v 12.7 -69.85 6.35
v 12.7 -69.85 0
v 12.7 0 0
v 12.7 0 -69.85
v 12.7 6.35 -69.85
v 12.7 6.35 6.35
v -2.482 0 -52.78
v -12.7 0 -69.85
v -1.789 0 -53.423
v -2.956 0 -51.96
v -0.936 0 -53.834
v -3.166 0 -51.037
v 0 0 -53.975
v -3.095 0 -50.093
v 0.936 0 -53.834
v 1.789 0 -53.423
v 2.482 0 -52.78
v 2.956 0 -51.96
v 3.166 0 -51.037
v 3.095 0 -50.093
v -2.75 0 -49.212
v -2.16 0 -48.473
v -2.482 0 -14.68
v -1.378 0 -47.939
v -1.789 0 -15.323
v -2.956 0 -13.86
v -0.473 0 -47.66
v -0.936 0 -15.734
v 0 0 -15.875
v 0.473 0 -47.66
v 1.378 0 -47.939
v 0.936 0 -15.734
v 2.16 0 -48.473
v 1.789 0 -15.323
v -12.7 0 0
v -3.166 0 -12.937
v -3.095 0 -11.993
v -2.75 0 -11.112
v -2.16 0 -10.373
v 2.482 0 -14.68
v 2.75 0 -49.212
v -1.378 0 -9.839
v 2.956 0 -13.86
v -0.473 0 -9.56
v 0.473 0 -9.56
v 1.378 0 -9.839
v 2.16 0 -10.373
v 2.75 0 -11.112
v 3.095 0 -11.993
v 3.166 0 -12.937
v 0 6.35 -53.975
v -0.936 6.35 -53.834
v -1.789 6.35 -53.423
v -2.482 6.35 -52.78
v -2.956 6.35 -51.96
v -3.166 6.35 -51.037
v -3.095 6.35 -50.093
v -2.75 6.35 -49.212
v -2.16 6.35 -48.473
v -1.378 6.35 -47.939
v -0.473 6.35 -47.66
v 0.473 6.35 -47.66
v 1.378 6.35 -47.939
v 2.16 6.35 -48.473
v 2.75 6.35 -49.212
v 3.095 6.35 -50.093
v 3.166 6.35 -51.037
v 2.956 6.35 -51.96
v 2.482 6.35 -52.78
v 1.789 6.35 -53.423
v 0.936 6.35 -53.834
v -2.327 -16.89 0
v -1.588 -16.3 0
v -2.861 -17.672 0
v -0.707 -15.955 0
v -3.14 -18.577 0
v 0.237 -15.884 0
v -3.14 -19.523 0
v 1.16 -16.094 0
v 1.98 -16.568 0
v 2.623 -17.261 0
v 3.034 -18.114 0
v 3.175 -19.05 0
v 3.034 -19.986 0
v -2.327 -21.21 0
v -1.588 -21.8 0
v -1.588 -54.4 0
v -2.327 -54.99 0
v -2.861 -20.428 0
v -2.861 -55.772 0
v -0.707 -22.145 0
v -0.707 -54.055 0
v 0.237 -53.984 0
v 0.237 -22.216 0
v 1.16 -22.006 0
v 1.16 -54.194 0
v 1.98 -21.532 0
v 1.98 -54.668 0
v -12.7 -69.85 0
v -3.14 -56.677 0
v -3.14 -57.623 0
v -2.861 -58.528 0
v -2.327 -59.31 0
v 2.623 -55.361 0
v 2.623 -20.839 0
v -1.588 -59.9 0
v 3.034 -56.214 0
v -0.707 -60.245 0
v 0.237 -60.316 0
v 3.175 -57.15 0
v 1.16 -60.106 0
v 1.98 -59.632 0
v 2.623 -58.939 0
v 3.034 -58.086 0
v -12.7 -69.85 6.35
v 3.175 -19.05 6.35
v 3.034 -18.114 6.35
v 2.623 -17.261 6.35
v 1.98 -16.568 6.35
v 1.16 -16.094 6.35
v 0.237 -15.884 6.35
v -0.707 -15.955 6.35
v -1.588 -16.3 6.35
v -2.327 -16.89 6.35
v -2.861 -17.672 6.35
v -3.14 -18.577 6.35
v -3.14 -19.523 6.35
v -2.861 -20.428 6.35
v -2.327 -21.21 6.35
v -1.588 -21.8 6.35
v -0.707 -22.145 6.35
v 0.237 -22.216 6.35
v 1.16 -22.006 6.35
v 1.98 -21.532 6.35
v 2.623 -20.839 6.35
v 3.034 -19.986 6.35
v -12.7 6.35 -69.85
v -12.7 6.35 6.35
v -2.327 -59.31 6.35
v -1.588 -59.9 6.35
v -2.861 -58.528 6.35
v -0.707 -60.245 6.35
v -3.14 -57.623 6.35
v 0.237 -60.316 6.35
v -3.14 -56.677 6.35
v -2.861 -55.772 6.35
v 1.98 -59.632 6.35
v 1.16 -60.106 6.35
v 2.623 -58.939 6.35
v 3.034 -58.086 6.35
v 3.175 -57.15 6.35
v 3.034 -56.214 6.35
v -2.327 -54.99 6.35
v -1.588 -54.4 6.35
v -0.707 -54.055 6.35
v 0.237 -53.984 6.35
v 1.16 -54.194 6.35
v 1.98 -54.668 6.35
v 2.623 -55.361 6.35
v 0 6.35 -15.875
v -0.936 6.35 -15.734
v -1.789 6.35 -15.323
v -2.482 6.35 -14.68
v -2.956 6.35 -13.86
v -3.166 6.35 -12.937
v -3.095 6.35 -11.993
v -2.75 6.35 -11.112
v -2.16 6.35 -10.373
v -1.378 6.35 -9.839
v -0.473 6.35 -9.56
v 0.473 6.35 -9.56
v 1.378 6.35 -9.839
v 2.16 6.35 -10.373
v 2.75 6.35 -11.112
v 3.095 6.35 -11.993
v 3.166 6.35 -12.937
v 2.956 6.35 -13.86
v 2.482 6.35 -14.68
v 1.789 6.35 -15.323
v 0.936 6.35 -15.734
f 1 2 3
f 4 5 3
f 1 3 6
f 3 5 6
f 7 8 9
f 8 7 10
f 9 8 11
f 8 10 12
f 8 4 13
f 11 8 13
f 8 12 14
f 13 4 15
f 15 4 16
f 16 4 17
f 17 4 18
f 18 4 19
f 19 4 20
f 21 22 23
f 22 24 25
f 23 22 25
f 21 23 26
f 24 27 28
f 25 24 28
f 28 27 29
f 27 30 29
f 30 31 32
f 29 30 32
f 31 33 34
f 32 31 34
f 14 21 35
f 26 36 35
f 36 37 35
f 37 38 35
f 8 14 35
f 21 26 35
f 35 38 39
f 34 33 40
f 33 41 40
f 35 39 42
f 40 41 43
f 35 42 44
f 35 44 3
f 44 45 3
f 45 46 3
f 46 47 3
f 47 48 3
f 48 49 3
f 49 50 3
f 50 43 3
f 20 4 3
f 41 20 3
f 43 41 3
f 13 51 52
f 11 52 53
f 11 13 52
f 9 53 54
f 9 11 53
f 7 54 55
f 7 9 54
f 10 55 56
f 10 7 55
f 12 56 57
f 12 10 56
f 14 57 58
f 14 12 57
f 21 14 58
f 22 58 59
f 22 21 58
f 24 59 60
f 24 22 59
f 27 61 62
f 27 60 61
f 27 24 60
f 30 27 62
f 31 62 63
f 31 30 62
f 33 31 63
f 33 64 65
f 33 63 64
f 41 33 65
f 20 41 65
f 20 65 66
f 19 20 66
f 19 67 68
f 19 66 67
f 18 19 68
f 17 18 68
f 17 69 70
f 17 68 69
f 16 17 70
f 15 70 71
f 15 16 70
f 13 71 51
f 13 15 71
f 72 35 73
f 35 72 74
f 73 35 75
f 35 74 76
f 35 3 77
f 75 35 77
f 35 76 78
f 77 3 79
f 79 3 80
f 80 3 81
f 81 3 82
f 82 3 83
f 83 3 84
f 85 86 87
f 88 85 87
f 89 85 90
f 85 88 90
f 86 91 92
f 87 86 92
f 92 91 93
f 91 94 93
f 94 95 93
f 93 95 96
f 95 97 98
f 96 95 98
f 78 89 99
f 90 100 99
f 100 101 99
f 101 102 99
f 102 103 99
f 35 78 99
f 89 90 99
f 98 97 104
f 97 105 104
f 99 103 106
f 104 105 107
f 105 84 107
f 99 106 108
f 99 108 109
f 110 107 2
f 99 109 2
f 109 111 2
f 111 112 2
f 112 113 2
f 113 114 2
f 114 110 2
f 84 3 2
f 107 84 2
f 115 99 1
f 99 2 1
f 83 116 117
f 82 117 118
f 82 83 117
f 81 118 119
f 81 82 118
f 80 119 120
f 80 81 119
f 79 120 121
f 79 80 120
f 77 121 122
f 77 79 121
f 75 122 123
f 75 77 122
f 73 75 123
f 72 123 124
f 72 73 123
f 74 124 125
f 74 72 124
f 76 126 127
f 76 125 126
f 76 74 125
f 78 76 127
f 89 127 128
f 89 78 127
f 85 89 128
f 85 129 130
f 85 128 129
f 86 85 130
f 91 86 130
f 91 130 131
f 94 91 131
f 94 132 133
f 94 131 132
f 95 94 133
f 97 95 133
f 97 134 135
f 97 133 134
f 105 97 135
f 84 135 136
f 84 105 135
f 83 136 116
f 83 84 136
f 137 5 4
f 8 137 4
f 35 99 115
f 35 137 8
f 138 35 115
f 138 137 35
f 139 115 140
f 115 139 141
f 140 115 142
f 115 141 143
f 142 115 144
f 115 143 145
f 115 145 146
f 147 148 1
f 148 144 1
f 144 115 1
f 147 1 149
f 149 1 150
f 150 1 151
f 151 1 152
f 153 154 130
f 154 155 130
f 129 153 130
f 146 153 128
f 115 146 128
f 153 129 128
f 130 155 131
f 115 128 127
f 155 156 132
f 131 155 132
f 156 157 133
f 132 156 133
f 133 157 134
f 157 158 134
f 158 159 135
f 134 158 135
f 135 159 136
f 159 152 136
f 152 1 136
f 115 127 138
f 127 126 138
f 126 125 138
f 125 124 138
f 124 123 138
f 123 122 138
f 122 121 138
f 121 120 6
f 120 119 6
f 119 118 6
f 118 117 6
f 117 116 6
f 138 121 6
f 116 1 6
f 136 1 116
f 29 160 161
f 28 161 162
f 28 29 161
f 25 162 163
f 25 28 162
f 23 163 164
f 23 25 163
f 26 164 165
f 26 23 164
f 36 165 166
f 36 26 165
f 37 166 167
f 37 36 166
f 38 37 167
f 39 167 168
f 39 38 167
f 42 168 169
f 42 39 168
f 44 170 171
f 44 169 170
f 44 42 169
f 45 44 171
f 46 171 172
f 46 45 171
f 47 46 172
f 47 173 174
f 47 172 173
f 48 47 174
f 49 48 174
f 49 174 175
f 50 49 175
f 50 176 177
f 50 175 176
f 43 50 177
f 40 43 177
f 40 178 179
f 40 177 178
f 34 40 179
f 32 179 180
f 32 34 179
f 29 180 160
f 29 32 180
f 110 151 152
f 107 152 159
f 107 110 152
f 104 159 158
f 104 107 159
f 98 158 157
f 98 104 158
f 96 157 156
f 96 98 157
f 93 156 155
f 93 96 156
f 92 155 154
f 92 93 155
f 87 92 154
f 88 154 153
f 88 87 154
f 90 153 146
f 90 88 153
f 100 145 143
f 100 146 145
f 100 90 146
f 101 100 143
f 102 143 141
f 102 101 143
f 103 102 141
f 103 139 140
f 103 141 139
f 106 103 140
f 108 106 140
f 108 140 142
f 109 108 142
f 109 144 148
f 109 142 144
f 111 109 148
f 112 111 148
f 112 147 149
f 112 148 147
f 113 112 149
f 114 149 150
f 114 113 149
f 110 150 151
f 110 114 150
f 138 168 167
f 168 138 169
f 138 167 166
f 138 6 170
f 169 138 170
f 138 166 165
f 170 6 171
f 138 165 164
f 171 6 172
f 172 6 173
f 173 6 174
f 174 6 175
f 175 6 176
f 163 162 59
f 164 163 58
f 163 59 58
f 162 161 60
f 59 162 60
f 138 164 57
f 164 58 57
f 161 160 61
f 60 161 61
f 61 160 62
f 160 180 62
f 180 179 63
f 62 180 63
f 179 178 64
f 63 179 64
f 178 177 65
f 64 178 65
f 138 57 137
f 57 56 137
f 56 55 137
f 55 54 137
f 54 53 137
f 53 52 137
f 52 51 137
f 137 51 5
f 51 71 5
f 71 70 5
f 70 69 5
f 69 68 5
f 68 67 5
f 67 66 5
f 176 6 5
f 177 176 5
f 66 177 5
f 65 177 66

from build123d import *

# Parameters (mm, degrees)
BOSS_EXTRUDE1_DEPTH = 12.7
SKETCH2_R           = 3.175
CUT_EXTRUDE1_DEPTH  = 100.595858348
SKETCH3_R           = 3.175
CUT_EXTRUDE2_DEPTH  = 100.595858348


with BuildPart() as part:
    # Sketch1 → Boss-Extrude1 (new, symmetric)
    with BuildSketch(Plane(origin=(0, 0, 0), x_dir=(0, 0, -1), z_dir=(1, 0, 0))):
        Polygon((0, 0), (0, -69.85), (-6.35, -69.85), (-6.35, 6.35), (69.85, 6.35), (69.85, 0), align=None)
    extrude(amount=BOSS_EXTRUDE1_DEPTH, both=True)

    # Sketch2 → Cut-Extrude1 (cut, through all)
    with BuildSketch(Plane(origin=(0, 0, 0), x_dir=(1, 0, 0), z_dir=(0, 1, 0))):
        with Locations(Location((0, 50.8, 0), (0, 0, 90))):
            Circle(SKETCH2_R)
        with Locations(Location((0, 12.7, 0), (0, 0, 90))):
            Circle(SKETCH2_R)
    extrude(amount=CUT_EXTRUDE1_DEPTH, mode=Mode.SUBTRACT)

    # Sketch3 → Cut-Extrude2 (cut, through all)
    with BuildSketch(Plane.XY):
        with Locations((0, -57.15)):
            Circle(SKETCH3_R)
        with Locations((0, -19.05)):
            Circle(SKETCH3_R)
    extrude(amount=CUT_EXTRUDE2_DEPTH, mode=Mode.SUBTRACT)


solid = part.part
